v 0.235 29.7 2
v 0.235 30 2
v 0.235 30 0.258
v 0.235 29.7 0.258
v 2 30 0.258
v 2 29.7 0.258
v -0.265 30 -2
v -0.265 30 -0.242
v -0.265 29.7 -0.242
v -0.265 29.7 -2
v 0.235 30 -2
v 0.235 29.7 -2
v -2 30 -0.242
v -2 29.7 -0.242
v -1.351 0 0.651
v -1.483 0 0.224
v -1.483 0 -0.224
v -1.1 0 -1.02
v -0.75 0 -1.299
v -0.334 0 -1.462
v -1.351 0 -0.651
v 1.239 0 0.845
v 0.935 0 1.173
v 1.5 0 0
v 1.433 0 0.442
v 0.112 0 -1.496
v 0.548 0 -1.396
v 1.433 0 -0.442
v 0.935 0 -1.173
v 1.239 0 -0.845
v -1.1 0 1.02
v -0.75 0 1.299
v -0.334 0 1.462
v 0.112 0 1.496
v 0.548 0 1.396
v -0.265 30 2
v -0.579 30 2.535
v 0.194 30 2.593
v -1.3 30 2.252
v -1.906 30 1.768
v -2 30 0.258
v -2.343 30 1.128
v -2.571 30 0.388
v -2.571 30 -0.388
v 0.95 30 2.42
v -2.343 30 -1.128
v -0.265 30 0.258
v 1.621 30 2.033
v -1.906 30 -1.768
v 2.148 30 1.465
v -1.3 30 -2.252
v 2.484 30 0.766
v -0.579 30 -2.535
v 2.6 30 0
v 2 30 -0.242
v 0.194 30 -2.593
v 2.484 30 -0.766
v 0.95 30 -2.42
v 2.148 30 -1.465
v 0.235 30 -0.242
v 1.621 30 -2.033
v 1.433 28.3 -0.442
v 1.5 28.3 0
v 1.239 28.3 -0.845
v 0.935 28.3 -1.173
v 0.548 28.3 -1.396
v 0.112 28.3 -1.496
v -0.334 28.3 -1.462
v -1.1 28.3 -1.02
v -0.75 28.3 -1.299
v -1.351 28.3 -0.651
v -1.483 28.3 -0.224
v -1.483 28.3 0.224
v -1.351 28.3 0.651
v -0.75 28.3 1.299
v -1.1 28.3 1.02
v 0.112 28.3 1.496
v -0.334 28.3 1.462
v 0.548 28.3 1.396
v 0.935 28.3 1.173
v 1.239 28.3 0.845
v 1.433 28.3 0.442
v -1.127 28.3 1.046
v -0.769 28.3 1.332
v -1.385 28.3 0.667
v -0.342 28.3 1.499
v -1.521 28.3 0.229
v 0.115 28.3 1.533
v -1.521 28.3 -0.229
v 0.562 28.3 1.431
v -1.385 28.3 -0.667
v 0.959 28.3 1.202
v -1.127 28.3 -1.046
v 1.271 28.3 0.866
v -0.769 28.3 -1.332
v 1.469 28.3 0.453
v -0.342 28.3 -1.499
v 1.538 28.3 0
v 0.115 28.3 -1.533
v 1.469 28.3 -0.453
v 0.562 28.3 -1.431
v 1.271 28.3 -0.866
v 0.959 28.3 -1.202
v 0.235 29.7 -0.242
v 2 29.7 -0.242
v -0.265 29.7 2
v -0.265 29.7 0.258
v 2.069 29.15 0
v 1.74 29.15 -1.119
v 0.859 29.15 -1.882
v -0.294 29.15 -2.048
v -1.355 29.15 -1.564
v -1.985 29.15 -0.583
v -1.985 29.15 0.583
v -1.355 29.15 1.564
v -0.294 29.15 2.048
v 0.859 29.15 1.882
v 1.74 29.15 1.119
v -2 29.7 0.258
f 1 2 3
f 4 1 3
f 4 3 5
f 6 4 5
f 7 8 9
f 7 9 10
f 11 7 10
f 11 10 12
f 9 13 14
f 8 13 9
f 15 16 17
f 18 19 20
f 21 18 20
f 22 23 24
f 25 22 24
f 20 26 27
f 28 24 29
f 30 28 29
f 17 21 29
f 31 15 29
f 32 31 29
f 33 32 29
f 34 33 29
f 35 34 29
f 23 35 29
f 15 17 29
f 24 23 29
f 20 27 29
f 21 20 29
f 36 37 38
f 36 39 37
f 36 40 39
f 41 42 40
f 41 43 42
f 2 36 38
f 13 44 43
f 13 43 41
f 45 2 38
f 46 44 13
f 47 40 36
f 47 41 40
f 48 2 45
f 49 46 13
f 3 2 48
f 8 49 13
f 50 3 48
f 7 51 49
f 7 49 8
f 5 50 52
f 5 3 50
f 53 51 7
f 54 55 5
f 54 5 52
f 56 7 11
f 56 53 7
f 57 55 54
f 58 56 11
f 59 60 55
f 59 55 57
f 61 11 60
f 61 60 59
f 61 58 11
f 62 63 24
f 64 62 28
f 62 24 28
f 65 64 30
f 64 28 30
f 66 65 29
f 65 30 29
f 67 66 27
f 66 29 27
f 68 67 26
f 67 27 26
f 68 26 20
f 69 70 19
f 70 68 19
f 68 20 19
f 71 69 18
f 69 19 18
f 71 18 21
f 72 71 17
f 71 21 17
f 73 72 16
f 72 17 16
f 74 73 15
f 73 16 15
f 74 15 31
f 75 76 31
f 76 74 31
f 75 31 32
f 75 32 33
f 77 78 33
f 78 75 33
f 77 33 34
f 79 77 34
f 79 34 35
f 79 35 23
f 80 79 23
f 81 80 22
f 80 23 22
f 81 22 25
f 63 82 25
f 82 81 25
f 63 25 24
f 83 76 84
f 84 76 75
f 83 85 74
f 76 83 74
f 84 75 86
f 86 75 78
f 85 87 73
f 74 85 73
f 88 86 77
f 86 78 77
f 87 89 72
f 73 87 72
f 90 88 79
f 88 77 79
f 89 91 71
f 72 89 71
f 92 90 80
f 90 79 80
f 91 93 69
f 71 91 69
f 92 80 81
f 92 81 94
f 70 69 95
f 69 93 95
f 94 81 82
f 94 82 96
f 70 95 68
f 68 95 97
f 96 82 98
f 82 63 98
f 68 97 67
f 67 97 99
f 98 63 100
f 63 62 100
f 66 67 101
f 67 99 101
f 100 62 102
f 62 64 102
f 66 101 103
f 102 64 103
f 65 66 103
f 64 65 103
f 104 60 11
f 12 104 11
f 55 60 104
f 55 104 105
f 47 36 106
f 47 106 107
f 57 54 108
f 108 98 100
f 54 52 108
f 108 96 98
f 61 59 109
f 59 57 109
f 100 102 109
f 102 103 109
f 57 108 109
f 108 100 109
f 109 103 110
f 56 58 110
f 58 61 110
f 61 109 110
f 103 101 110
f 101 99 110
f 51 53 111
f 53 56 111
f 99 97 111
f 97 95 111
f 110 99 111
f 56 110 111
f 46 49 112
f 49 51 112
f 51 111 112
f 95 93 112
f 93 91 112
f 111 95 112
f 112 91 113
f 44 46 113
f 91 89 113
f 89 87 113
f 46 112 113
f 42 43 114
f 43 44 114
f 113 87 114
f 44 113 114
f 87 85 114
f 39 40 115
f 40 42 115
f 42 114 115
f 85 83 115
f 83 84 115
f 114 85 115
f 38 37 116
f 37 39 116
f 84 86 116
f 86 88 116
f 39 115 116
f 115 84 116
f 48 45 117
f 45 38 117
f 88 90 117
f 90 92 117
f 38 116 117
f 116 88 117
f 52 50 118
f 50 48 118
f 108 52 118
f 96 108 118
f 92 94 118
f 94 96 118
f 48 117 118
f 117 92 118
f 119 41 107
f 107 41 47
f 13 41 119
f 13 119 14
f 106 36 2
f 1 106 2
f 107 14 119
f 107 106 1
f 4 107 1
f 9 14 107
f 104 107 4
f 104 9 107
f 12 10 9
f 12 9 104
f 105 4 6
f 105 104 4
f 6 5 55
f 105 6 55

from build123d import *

# Parameters (mm, degrees)
SKETCH1_R           = 1.5
BOSS_EXTRUDE1_DEPTH = 30
SKETCH2_R           = 2.6
BOSS_EXTRUDE2_DEPTH = 1.7
BOSS_EXTRUDE2_TAPER = 32
SKETCH3_W           = 0.5
SKETCH3_H           = 1.758378485
SKETCH3_H_2         = 1.741621515
SKETCH3_W_2         = 1.734727157
SKETCH3_H_3         = 0.5
SKETCH3_W_3         = 1.765272843
CUT_EXTRUDE1_DEPTH  = 0.3


with BuildPart() as part:
    # Sketch1 → Boss-Extrude1 (new body)
    with BuildSketch(Plane(origin=(0, 0, 0), x_dir=(1, 0, 0), z_dir=(0, 1, 0))):
        Circle(SKETCH1_R)
    extrude(amount=BOSS_EXTRUDE1_DEPTH)

    # Sketch2 → Boss-Extrude2 (add)
    with BuildSketch(Plane(origin=(0, 30, 0), x_dir=(1, 0, 0), z_dir=(0, 1, 0))):
        Circle(SKETCH2_R)
    extrude(amount=-BOSS_EXTRUDE2_DEPTH, taper=BOSS_EXTRUDE2_TAPER)

    # Sketch3 → Cut-Extrude1 (cut)
    with BuildSketch(Plane(origin=(0, 30, 0), x_dir=(1, 0, 0), z_dir=(0, 1, 0))):
        with Locations((-0.015272843, 1.120810757)):
            Rectangle(SKETCH3_W, SKETCH3_H)
        with Locations((-0.015272843, -1.129189243)):
            Rectangle(SKETCH3_W, SKETCH3_H_2)
        with Locations((-1.132636421, -0.008378485)):
            Rectangle(SKETCH3_W_2, SKETCH3_H_3)
        with Locations((1.117363579, -0.008378485)):
            Rectangle(SKETCH3_W_3, SKETCH3_H_3)
        with Locations((-0.015272843, -0.008378485)):
            Rectangle(SKETCH3_W, SKETCH3_H_3)
    extrude(amount=-CUT_EXTRUDE1_DEPTH, mode=Mode.SUBTRACT)


solid = part.part
